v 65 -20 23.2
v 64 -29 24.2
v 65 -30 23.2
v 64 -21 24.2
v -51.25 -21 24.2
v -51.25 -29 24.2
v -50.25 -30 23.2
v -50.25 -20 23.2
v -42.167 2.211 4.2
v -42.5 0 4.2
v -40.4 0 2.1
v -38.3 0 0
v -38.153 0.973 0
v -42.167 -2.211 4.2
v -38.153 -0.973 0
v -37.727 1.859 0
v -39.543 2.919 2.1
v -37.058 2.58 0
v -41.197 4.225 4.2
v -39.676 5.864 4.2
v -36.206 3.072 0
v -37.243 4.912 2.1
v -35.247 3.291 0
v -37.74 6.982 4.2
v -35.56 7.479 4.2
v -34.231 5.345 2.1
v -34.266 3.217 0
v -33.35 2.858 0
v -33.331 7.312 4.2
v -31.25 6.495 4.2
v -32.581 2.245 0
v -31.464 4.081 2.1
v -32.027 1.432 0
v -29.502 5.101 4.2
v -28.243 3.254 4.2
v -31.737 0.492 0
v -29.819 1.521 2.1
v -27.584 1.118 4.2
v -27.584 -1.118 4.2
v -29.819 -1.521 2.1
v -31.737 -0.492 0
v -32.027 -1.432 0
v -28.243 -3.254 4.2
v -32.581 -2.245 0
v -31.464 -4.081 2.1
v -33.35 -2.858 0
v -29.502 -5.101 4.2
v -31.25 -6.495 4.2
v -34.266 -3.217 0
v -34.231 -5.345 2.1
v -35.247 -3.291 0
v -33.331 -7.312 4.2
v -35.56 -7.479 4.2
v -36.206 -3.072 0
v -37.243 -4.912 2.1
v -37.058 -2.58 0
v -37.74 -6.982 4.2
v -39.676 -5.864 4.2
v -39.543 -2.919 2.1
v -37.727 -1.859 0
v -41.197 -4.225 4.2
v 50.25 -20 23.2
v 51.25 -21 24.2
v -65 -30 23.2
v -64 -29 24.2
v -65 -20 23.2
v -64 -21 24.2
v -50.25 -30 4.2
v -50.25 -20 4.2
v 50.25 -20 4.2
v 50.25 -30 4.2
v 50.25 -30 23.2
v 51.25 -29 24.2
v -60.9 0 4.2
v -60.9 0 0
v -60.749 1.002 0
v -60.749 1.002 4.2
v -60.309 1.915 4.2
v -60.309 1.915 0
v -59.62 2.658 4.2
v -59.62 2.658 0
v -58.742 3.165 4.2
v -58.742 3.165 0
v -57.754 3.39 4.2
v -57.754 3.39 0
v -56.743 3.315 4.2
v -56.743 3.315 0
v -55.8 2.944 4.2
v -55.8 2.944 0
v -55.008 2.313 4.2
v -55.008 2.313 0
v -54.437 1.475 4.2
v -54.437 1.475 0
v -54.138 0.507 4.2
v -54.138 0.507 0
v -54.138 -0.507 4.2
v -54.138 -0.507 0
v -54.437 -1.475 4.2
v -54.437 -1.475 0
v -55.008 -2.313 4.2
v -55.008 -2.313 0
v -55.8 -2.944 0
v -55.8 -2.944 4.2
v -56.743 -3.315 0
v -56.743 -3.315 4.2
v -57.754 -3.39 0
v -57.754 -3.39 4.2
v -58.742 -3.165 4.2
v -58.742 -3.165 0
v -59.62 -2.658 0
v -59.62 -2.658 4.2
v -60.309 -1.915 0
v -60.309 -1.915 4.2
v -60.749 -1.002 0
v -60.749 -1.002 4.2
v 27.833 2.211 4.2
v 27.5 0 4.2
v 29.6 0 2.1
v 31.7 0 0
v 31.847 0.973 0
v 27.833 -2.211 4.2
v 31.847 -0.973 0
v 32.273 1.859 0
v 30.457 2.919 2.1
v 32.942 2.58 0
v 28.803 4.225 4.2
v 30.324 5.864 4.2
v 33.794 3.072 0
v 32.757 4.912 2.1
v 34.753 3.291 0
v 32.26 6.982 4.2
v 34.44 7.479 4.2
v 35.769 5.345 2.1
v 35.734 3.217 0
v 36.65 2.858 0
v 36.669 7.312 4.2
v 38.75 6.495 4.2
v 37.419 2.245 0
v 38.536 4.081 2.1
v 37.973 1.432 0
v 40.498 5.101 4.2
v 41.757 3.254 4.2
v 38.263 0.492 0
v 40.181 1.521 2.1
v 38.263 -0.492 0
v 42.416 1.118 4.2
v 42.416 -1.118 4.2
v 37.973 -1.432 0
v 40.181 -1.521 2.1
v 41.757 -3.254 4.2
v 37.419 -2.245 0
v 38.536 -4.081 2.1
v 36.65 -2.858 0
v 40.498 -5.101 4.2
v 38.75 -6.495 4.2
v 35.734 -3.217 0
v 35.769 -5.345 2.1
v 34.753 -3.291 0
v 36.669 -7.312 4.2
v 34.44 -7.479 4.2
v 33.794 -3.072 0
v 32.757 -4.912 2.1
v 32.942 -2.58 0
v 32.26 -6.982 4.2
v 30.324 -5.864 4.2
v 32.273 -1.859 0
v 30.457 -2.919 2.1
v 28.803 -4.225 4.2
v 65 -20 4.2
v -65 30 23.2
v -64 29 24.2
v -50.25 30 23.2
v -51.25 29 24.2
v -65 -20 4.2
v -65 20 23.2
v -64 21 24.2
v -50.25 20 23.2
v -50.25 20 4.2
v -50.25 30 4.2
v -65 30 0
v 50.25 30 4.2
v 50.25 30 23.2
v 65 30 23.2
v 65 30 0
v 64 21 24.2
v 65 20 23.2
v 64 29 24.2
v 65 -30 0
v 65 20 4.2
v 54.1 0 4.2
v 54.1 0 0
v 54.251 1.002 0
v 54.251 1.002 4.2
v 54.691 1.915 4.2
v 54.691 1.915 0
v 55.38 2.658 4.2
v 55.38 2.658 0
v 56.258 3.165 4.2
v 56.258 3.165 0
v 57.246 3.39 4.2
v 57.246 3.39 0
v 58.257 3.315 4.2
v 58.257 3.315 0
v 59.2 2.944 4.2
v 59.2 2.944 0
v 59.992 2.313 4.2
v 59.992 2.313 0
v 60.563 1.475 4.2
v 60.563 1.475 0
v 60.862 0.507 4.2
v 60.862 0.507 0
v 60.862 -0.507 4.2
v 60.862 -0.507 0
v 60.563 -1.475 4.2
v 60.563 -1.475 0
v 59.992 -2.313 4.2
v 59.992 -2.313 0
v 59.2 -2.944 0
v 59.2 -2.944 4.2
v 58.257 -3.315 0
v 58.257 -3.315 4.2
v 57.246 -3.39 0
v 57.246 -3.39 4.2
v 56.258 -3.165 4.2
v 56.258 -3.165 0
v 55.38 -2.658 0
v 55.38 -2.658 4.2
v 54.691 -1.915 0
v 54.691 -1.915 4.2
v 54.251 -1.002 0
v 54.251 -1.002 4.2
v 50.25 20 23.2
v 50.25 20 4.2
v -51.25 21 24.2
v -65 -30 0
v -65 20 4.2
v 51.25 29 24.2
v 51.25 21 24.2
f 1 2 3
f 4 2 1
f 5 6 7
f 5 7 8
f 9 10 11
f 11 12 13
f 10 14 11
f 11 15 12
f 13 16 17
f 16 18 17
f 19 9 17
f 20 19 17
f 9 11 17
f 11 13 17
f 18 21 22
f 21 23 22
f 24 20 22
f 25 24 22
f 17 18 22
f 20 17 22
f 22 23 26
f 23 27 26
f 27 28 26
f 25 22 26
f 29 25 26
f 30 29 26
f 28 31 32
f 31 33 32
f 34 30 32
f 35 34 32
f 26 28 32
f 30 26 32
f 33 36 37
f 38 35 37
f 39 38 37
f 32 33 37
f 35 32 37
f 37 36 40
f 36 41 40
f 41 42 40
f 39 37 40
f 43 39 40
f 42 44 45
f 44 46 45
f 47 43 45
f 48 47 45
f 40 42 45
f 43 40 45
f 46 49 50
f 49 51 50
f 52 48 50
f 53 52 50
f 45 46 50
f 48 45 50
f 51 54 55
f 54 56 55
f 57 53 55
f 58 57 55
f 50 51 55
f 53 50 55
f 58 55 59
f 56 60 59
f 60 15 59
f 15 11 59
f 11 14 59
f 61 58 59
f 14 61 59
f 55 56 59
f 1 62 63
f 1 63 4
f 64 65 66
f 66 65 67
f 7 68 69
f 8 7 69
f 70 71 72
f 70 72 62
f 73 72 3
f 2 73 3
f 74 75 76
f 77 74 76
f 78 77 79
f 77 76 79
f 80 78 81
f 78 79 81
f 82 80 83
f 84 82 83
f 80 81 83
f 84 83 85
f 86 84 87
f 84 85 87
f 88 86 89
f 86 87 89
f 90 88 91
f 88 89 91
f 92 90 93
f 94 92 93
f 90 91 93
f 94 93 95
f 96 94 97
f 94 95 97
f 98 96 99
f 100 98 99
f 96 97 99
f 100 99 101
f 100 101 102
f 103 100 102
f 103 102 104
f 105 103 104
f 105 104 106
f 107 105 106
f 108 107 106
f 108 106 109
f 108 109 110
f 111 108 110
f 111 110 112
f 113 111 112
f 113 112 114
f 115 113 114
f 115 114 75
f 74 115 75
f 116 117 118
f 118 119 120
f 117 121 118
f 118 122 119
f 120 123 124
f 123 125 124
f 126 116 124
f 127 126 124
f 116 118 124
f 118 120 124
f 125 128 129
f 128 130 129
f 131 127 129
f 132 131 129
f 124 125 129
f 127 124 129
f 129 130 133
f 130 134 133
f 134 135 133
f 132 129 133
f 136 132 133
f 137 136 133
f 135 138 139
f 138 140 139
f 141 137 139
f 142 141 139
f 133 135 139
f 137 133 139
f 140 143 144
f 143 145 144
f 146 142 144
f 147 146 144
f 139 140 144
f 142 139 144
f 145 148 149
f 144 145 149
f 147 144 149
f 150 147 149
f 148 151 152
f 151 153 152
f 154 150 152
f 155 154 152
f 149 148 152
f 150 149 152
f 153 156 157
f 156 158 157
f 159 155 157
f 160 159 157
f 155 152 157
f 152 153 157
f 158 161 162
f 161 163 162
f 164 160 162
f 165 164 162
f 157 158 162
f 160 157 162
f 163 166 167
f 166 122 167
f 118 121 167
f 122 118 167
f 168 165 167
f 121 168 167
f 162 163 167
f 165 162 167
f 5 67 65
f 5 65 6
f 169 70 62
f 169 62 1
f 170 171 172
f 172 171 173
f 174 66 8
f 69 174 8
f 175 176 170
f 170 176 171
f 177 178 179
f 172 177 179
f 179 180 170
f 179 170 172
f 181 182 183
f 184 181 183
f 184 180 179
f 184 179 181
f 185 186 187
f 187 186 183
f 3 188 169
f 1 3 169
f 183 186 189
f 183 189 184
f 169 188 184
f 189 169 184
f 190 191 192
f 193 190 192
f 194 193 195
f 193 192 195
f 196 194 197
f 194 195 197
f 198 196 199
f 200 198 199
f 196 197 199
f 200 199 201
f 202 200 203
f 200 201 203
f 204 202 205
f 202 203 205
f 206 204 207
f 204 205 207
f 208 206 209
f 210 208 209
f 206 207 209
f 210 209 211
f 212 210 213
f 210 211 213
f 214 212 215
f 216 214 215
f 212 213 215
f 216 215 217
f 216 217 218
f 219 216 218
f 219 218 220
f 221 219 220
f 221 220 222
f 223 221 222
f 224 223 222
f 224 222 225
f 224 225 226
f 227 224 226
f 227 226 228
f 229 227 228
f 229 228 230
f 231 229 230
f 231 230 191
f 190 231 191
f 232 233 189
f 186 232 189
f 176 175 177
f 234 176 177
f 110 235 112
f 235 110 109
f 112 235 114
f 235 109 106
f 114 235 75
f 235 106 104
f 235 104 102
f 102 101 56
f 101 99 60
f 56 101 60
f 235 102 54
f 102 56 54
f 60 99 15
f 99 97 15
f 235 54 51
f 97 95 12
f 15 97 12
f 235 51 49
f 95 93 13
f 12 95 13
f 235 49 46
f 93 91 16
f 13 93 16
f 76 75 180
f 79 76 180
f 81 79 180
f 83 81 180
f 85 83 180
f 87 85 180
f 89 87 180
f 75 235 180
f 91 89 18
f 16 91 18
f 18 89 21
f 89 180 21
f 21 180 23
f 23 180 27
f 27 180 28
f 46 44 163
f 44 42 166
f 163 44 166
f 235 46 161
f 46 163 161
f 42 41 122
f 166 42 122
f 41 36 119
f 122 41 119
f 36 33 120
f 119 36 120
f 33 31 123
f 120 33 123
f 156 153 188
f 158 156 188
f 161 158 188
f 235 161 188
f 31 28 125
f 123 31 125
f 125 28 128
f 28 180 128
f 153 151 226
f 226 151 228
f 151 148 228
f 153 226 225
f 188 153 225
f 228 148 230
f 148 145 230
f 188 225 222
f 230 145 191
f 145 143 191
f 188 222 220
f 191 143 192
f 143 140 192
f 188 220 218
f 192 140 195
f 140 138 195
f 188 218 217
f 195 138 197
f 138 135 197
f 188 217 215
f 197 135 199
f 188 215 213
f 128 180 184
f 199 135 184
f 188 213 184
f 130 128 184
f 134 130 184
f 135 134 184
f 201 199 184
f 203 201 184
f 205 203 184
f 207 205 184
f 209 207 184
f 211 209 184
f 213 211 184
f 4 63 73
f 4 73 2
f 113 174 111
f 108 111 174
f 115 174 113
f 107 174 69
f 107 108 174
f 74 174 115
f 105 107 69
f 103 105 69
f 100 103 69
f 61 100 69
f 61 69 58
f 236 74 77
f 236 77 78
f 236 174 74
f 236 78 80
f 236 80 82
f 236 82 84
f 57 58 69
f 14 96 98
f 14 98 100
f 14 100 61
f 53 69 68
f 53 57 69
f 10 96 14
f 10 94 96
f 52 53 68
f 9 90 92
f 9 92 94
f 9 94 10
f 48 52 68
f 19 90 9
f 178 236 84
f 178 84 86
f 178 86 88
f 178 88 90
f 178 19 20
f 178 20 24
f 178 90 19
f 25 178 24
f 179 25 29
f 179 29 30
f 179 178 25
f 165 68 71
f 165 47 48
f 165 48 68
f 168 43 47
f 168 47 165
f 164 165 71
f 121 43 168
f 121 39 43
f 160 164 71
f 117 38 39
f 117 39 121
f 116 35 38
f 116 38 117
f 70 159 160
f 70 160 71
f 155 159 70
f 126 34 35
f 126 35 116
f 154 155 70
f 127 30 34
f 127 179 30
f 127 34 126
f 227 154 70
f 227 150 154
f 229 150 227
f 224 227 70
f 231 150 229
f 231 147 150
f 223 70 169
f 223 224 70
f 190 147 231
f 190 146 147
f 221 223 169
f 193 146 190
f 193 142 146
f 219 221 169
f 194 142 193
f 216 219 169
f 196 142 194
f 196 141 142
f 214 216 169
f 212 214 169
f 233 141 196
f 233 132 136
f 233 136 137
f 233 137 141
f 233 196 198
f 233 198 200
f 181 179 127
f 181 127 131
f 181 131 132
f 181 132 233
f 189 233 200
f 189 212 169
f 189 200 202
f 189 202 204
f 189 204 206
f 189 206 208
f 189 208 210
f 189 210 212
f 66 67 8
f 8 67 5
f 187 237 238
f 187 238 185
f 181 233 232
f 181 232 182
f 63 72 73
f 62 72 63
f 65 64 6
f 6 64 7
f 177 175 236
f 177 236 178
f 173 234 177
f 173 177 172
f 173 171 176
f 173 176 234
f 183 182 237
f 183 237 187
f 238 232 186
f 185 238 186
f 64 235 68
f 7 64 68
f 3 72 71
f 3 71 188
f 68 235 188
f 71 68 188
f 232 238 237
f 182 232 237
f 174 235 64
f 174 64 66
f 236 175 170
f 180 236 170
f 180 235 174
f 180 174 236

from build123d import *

# Parameters (mm, degrees)
F0_W           = 130
F0_H           = 60
F1_DEPTH       = 4.2
F2_W           = 14.75
F2_H           = 10
F3_DEPTH       = 20
F5_D           = 6.8
F7_D           = 6
F7_CSINK_D     = 15
F7_CSINK_ANGLE = 90
F8_SIZE        = 1


with BuildPart() as f1:
    # F0 (on Top) → F1 (new body)
    with BuildSketch(Plane.XY):
        Rectangle(F0_W, F0_H)
    extrude(amount=F1_DEPTH)

    # F2 (on face) → F3 (join)
    with BuildSketch(Plane.XY.offset(4.2)):
        with Locations((-57.625, 25)):
            Rectangle(F2_W, F2_H)
        with Locations((-57.625, -25)):
            Rectangle(F2_W, F2_H)
        with Locations((57.625, -25)):
            Rectangle(F2_W, F2_H)
        with Locations((57.625, 25)):
            Rectangle(F2_W, F2_H)
    extrude(amount=F3_DEPTH)

    # F5 (through all)
    with Locations(Plane.XY.offset(4.2)):
        with Locations((57.5, 0), (-57.5, 0)):
            Hole(F5_D / 2)

    # F7 (through all)
    with Locations(Plane.XY.offset(4.2)):
        with Locations((35, 0), (-35, 0)):
            CounterSinkHole(F7_D / 2, F7_CSINK_D / 2, counter_sink_angle=F7_CSINK_ANGLE)

    # F8
    f8_edges = [f1.edges().sort_by_distance(p)[0] for p in [
        (-50.25, -25, 24.2),
        (-57.625, -30, 24.2),
        (-65, -25, 24.2),
        (-57.625, -20, 24.2),
        (-57.625, 30, 24.2),
        (-65, 25, 24.2),
        (-57.625, 20, 24.2),
        (-50.25, 25, 24.2),
        (65, -25, 24.2),
        (57.625, -20, 24.2),
        (50.25, -25, 24.2),
        (57.625, -30, 24.2),
        (57.625, 30, 24.2),
        (50.25, 25, 24.2),
        (57.625, 20, 24.2),
        (65, 25, 24.2),
    ]]
    chamfer(f8_edges, length=F8_SIZE)


solid = f1.part
